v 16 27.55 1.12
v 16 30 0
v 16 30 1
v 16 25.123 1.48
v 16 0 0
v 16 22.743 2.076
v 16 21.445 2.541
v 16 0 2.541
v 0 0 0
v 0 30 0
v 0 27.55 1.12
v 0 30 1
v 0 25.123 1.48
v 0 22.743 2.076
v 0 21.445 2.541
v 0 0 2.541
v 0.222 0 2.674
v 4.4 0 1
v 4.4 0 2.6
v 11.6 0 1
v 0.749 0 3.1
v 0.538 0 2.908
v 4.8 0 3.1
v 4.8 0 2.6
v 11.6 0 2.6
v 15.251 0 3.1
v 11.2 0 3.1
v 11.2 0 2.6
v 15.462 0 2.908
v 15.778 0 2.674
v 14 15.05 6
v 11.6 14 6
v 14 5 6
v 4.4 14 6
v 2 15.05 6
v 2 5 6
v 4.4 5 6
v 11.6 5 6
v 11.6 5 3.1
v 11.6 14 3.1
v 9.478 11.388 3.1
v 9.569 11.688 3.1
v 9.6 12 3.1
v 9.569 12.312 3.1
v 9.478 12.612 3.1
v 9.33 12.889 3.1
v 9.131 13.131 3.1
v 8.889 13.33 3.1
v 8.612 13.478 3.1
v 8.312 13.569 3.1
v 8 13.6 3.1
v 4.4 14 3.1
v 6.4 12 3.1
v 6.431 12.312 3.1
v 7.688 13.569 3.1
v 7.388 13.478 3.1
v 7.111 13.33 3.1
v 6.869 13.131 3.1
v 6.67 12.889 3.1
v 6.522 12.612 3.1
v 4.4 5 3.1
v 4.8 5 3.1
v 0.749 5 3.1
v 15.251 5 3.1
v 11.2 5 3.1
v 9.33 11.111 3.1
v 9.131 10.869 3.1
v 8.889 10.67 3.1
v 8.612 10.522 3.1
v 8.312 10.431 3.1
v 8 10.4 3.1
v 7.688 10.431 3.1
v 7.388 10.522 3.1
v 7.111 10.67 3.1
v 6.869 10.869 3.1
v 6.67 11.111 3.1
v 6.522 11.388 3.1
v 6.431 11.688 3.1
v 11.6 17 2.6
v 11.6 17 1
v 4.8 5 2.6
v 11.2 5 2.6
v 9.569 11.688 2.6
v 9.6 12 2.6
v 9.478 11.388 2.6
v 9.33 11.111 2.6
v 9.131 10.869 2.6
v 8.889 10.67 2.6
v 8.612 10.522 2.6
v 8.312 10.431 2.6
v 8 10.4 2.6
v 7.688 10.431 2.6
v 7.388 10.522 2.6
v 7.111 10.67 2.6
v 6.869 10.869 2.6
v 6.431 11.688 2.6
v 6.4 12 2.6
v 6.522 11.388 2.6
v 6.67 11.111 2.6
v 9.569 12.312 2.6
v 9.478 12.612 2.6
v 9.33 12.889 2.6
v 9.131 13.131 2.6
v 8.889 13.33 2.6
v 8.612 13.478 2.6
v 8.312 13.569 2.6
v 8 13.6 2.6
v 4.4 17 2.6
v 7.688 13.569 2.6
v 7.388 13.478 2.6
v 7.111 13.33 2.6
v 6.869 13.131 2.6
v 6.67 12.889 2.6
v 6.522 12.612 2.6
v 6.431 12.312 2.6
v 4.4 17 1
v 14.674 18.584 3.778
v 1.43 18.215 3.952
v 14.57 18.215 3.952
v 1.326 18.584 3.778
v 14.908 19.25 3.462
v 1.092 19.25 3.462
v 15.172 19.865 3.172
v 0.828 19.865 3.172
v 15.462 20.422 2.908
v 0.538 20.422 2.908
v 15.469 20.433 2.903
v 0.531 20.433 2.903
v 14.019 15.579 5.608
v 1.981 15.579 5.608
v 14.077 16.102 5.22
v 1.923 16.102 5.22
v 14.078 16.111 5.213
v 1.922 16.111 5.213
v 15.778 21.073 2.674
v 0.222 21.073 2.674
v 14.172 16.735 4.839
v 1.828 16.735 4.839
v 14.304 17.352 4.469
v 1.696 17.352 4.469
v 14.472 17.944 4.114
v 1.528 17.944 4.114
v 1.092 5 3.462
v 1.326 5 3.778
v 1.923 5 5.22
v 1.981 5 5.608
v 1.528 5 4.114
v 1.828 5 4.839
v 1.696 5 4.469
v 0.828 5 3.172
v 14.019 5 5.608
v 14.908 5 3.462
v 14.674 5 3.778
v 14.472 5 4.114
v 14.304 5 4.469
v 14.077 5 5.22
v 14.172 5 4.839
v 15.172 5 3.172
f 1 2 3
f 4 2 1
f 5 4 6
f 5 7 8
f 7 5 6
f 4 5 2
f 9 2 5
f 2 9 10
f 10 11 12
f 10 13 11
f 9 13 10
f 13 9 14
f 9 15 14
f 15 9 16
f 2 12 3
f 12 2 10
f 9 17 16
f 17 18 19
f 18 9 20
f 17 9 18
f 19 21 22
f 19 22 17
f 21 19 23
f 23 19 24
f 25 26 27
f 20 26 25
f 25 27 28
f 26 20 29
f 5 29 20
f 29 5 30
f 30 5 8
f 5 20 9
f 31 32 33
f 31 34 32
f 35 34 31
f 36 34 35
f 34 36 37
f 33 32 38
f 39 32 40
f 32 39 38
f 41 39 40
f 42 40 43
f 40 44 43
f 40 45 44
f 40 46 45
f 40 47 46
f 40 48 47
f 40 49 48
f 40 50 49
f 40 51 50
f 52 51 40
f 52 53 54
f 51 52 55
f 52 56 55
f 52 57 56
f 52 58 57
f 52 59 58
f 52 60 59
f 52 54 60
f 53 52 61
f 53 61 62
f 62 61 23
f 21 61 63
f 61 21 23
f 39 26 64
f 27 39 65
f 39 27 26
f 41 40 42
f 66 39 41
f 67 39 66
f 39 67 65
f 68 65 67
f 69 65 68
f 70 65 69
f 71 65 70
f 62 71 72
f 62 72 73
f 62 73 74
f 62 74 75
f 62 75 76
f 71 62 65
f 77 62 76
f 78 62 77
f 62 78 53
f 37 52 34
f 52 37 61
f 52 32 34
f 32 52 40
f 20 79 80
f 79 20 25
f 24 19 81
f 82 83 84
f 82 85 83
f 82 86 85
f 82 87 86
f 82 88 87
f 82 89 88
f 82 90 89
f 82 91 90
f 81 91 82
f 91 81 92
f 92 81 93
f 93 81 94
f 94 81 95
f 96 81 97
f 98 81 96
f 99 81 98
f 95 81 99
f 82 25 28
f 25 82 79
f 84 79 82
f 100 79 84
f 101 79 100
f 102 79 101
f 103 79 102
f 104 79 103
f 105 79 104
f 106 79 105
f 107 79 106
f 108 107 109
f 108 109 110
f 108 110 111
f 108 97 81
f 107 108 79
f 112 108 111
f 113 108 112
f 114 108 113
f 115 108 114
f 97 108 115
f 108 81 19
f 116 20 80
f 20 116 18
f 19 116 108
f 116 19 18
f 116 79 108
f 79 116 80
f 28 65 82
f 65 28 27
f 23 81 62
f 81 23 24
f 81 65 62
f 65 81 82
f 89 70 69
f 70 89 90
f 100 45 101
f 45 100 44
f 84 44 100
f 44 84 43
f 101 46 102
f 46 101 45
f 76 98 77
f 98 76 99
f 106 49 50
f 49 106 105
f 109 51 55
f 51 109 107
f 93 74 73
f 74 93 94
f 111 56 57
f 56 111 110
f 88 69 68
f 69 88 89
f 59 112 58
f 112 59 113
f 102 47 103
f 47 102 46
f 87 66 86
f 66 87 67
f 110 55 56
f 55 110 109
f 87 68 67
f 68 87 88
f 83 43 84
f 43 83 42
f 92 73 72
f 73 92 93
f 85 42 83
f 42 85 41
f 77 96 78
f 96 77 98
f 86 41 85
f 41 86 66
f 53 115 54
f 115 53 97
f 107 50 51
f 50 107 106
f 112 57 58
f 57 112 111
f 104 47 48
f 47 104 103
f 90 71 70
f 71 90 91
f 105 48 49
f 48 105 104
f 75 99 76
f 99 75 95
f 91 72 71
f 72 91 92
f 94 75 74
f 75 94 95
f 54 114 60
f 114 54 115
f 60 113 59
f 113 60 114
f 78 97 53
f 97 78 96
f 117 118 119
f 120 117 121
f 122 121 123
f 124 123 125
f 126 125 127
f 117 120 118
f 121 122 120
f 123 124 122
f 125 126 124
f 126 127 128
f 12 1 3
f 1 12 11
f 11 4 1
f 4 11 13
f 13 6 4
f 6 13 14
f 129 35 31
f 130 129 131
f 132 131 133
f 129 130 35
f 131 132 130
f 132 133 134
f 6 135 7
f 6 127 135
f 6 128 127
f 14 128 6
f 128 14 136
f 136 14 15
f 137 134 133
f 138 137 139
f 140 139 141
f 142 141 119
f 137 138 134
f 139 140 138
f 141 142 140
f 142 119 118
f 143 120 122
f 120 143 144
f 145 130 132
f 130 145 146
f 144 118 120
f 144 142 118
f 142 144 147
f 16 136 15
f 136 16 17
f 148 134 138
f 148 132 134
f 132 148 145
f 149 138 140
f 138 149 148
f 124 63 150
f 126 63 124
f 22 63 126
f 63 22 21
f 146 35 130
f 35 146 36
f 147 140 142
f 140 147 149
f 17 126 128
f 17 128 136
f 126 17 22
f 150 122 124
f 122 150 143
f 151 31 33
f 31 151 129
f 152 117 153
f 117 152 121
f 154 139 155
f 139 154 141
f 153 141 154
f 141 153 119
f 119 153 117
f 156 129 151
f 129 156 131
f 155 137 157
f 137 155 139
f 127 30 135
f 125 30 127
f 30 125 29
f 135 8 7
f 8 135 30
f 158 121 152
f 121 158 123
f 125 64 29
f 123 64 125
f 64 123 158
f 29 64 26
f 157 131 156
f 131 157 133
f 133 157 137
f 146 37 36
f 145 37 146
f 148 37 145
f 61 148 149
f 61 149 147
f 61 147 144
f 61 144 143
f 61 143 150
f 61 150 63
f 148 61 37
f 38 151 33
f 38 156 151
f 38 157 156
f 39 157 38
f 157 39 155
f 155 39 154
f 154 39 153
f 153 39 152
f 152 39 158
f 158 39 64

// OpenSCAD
difference()
{
	union()
	{
		cube([ 16.0, 30.0, 3.0 ]);
		cube([ 16.0, 22.0, 6.0 ]);
	}
	translate([ 8.0 - 3.6, -1.0, 3.1 ])
	cube([ 7.2, 15.0, 4.0 ]);
	translate([ 8.0 - 3.6, -1.0, 1.0 ])
	cube([ 7.2, 18.0, 1.6 ]);
	translate([ 8.0 - 3.2, -1.0, 1.0 ])
	cube([ 6.4, 6.0, 6.0 ]);
	translate([ 8.0, 12.0, 2.0 ])
	cylinder($fn = 32, r = 1.6, h = 6.0);
	translate([ -2.0, 30.0, 26.0 ])
	rotate([ 0.0, 90.0, 0.0 ])
	cylinder($fn = 64, r = 25.0, h = 20.0);
	translate([ -2.0, 32.0, 6.0 ])
	rotate([ 90.0, 0.0, 0.0 ])
	cylinder($fn = 64, r = 4, h = 34);
	translate([ 18.0, 32.0, 6.0 ])
	rotate([ 90.0, 0.0, 0.0 ])
	cylinder($fn = 64, r = 4, h = 34);
	translate([ -1.0, -1.0, 3.1 ])
	cube([ 18.0, 6.0, 4.0 ]);
}
